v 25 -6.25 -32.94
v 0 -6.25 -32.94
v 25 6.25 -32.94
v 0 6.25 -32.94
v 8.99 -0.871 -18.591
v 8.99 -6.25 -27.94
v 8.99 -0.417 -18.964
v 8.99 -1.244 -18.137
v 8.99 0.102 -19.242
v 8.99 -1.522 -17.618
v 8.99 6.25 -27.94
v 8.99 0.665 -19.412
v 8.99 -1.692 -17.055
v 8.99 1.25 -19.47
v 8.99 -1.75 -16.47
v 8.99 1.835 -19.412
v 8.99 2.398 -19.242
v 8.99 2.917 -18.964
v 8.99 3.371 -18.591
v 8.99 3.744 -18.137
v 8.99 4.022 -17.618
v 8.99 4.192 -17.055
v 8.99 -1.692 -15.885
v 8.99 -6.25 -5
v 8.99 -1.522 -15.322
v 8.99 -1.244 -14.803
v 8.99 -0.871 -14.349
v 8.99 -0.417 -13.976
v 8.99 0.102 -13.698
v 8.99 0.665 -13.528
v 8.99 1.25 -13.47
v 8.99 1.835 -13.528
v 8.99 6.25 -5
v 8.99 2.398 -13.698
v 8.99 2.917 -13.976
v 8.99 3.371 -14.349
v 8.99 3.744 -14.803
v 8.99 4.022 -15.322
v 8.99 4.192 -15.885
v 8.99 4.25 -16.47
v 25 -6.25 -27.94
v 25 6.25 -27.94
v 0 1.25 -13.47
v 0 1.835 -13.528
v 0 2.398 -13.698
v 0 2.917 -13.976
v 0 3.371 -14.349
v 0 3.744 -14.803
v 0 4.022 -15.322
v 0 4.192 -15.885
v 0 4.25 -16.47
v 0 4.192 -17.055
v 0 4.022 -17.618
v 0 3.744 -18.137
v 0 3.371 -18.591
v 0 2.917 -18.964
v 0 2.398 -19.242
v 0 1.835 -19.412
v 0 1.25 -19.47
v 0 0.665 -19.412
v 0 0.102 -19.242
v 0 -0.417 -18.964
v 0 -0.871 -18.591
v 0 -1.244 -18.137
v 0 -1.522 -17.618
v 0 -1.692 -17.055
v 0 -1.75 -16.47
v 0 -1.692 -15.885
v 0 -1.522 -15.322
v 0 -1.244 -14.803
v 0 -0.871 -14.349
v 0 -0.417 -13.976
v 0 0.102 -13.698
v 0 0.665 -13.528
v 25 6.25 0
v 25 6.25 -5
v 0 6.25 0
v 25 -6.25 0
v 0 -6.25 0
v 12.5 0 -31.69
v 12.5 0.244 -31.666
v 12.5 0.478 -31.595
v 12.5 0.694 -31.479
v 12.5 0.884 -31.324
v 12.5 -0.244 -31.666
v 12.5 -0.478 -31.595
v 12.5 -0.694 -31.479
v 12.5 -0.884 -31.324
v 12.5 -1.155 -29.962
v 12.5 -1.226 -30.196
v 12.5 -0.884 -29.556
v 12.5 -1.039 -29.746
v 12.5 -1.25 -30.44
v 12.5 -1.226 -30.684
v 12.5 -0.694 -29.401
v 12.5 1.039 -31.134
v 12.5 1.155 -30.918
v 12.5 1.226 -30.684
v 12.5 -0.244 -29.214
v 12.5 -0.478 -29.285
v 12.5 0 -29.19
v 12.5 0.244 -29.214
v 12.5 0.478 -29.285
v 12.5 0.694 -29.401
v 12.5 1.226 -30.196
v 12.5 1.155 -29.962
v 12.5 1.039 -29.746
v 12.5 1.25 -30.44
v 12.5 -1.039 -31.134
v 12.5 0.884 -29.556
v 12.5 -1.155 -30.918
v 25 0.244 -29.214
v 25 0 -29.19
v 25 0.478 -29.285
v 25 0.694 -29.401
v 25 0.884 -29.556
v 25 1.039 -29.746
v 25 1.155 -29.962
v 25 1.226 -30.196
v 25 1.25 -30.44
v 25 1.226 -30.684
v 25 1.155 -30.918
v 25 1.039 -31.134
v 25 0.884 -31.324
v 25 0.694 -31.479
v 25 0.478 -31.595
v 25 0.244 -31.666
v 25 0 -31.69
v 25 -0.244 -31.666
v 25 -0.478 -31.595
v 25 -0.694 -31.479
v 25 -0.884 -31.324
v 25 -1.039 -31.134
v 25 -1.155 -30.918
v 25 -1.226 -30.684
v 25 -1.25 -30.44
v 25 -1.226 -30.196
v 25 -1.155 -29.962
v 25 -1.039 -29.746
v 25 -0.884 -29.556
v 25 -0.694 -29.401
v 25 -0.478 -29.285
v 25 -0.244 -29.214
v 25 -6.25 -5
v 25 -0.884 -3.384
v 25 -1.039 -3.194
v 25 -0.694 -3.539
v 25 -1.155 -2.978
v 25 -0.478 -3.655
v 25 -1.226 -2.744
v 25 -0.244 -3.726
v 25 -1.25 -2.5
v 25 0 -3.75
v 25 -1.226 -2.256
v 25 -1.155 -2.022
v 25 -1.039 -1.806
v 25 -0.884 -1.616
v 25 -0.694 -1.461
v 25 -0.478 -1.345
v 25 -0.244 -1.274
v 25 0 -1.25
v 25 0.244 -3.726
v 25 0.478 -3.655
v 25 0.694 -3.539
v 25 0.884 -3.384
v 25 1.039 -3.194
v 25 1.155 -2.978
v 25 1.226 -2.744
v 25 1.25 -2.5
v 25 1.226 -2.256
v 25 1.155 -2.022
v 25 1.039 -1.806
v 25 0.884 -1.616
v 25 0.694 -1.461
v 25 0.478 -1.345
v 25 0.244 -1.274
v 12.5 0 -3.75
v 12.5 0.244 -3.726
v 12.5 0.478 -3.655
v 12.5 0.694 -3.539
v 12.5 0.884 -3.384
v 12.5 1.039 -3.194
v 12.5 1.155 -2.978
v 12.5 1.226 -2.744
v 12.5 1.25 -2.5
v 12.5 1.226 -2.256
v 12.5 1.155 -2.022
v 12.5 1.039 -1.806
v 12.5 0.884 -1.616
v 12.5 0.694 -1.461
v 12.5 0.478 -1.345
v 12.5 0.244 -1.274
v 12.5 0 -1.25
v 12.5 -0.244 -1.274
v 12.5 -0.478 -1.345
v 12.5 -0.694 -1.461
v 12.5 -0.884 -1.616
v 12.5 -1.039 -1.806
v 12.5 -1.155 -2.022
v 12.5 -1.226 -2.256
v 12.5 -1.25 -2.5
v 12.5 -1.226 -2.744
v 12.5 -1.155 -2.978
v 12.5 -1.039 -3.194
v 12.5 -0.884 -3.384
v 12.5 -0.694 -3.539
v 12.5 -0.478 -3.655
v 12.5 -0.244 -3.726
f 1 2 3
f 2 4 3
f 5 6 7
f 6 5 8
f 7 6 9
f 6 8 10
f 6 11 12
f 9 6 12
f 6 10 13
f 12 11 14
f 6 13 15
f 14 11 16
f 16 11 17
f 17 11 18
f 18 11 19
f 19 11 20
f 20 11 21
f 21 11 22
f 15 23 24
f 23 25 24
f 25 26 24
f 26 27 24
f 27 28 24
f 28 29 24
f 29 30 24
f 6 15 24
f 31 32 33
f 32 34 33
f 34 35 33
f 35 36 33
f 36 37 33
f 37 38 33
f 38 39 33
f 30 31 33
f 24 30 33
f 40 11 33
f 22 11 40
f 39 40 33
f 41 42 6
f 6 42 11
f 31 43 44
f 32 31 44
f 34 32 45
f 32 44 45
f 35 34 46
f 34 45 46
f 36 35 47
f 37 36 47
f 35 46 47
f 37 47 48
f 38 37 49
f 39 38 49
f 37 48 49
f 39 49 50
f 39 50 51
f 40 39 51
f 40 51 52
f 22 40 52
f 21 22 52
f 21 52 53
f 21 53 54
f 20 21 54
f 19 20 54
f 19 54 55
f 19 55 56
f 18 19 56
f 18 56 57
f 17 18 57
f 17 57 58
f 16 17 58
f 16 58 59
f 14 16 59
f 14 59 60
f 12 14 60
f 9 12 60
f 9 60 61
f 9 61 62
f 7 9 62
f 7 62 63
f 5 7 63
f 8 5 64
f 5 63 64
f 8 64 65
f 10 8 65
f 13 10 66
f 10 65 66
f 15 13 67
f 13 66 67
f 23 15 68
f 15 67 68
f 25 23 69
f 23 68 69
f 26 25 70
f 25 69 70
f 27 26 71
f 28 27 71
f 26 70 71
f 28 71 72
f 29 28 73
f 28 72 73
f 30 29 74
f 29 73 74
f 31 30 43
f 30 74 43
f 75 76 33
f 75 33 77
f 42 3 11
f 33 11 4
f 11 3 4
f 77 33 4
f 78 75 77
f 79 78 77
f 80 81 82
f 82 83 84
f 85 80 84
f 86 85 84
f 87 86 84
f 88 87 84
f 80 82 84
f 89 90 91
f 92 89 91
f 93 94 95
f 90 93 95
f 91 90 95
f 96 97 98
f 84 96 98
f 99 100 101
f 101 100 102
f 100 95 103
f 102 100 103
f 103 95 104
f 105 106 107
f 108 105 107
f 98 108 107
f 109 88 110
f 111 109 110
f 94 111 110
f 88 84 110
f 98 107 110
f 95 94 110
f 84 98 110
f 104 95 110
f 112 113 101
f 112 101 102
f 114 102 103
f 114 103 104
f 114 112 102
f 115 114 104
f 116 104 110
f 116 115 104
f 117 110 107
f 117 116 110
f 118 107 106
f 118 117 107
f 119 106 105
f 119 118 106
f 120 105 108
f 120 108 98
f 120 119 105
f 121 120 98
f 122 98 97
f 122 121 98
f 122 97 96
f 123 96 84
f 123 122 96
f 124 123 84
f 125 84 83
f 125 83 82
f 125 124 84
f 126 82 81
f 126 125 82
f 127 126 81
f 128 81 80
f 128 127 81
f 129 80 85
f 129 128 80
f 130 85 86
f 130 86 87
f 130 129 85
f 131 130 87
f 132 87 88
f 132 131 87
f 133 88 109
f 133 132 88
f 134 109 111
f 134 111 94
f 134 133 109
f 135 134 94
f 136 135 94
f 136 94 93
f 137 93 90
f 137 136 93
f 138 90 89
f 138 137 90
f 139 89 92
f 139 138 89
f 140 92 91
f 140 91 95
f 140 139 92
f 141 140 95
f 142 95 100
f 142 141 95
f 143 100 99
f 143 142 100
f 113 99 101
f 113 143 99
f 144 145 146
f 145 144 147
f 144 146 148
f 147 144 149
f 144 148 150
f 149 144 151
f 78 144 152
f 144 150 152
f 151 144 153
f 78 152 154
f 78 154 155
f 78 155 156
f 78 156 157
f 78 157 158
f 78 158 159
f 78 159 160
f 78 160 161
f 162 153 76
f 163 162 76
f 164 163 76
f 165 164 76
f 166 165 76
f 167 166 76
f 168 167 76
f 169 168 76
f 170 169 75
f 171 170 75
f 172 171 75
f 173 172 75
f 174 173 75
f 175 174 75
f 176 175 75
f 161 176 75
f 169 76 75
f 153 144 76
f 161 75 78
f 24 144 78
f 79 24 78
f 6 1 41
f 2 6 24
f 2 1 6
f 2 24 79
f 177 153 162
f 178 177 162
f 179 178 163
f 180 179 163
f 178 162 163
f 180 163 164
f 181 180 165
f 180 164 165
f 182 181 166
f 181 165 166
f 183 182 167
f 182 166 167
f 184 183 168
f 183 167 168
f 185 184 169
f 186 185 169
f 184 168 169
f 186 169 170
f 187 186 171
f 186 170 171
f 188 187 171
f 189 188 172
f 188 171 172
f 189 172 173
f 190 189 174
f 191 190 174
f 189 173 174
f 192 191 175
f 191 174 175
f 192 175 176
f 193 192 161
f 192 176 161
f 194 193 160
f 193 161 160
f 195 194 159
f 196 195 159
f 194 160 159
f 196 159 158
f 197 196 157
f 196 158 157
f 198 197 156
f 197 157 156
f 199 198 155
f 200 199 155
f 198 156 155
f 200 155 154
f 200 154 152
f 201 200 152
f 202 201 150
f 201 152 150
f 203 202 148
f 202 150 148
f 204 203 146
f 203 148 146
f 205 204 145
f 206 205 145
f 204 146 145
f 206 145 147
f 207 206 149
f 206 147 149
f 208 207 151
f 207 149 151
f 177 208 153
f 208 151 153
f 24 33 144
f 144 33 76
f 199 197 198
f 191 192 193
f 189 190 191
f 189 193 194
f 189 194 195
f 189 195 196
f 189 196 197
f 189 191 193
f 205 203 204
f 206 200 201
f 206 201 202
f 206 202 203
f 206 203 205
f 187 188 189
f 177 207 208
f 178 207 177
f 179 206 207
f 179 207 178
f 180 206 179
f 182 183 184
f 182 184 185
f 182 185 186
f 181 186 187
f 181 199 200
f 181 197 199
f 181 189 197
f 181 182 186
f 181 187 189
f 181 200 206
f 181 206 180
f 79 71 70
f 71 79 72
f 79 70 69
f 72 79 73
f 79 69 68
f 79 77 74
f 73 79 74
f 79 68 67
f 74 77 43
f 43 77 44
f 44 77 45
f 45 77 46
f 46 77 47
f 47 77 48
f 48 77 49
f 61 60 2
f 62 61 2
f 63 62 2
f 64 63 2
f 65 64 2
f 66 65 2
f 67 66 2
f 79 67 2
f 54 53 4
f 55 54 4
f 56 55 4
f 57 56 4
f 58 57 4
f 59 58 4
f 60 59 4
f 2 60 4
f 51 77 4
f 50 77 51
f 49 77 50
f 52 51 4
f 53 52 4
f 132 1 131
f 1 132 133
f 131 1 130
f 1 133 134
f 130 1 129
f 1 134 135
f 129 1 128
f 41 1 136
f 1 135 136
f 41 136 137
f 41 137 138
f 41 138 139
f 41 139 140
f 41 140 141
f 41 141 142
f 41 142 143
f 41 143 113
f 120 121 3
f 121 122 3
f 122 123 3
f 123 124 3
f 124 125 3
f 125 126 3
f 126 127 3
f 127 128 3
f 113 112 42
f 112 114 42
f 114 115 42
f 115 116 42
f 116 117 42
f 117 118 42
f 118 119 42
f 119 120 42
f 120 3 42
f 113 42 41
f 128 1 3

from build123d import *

# Parameters (mm, degrees)
Y_KSEKLIK_EKSTR_ZYON1_DEPTH = 6.25
IZIM2_R                     = 1.25
KES_EKSTR_ZYON1_DEPTH       = 12.5
IZIM4_R                     = 3
KES_EKSTR_ZYON2_DEPTH       = 10


with BuildPart() as part:
    # Çizim1 → Yükseklik-Ekstrüzyon1 (new, symmetric)
    with BuildSketch(Plane(origin=(0, 0, 0), x_dir=(1, 0, 0), z_dir=(0, 1, 0))):
        Polygon((0, 0), (0, 32.94), (25, 32.94), (25, 27.94), (8.99, 27.94), (8.99, 5), (25, 5), (25, 0), align=None)
    extrude(amount=Y_KSEKLIK_EKSTR_ZYON1_DEPTH, both=True)

    # Çizim2 → Kes-Ekstrüzyon1 (cut)
    with BuildSketch(Plane(origin=(25, 0, 0), x_dir=(0, 0, -1), z_dir=(1, 0, 0))):
        with Locations((2.5, 0)):
            Circle(IZIM2_R)
    kes_ekstr_zyon1 = extrude(amount=-KES_EKSTR_ZYON1_DEPTH, mode=Mode.SUBTRACT)

    # Aynalama1: Kes-Ekstrüzyon1 across plane
    add(kes_ekstr_zyon1.mirror(Plane.XY.offset(-16.47)), mode=Mode.SUBTRACT)

    # Çizim4 → Kes-Ekstrüzyon2 (cut)
    with BuildSketch(Plane.ZY):
        with Locations((-16.47, 1.25)):
            Circle(IZIM4_R)
    extrude(amount=-KES_EKSTR_ZYON2_DEPTH, mode=Mode.SUBTRACT)


solid = part.part
